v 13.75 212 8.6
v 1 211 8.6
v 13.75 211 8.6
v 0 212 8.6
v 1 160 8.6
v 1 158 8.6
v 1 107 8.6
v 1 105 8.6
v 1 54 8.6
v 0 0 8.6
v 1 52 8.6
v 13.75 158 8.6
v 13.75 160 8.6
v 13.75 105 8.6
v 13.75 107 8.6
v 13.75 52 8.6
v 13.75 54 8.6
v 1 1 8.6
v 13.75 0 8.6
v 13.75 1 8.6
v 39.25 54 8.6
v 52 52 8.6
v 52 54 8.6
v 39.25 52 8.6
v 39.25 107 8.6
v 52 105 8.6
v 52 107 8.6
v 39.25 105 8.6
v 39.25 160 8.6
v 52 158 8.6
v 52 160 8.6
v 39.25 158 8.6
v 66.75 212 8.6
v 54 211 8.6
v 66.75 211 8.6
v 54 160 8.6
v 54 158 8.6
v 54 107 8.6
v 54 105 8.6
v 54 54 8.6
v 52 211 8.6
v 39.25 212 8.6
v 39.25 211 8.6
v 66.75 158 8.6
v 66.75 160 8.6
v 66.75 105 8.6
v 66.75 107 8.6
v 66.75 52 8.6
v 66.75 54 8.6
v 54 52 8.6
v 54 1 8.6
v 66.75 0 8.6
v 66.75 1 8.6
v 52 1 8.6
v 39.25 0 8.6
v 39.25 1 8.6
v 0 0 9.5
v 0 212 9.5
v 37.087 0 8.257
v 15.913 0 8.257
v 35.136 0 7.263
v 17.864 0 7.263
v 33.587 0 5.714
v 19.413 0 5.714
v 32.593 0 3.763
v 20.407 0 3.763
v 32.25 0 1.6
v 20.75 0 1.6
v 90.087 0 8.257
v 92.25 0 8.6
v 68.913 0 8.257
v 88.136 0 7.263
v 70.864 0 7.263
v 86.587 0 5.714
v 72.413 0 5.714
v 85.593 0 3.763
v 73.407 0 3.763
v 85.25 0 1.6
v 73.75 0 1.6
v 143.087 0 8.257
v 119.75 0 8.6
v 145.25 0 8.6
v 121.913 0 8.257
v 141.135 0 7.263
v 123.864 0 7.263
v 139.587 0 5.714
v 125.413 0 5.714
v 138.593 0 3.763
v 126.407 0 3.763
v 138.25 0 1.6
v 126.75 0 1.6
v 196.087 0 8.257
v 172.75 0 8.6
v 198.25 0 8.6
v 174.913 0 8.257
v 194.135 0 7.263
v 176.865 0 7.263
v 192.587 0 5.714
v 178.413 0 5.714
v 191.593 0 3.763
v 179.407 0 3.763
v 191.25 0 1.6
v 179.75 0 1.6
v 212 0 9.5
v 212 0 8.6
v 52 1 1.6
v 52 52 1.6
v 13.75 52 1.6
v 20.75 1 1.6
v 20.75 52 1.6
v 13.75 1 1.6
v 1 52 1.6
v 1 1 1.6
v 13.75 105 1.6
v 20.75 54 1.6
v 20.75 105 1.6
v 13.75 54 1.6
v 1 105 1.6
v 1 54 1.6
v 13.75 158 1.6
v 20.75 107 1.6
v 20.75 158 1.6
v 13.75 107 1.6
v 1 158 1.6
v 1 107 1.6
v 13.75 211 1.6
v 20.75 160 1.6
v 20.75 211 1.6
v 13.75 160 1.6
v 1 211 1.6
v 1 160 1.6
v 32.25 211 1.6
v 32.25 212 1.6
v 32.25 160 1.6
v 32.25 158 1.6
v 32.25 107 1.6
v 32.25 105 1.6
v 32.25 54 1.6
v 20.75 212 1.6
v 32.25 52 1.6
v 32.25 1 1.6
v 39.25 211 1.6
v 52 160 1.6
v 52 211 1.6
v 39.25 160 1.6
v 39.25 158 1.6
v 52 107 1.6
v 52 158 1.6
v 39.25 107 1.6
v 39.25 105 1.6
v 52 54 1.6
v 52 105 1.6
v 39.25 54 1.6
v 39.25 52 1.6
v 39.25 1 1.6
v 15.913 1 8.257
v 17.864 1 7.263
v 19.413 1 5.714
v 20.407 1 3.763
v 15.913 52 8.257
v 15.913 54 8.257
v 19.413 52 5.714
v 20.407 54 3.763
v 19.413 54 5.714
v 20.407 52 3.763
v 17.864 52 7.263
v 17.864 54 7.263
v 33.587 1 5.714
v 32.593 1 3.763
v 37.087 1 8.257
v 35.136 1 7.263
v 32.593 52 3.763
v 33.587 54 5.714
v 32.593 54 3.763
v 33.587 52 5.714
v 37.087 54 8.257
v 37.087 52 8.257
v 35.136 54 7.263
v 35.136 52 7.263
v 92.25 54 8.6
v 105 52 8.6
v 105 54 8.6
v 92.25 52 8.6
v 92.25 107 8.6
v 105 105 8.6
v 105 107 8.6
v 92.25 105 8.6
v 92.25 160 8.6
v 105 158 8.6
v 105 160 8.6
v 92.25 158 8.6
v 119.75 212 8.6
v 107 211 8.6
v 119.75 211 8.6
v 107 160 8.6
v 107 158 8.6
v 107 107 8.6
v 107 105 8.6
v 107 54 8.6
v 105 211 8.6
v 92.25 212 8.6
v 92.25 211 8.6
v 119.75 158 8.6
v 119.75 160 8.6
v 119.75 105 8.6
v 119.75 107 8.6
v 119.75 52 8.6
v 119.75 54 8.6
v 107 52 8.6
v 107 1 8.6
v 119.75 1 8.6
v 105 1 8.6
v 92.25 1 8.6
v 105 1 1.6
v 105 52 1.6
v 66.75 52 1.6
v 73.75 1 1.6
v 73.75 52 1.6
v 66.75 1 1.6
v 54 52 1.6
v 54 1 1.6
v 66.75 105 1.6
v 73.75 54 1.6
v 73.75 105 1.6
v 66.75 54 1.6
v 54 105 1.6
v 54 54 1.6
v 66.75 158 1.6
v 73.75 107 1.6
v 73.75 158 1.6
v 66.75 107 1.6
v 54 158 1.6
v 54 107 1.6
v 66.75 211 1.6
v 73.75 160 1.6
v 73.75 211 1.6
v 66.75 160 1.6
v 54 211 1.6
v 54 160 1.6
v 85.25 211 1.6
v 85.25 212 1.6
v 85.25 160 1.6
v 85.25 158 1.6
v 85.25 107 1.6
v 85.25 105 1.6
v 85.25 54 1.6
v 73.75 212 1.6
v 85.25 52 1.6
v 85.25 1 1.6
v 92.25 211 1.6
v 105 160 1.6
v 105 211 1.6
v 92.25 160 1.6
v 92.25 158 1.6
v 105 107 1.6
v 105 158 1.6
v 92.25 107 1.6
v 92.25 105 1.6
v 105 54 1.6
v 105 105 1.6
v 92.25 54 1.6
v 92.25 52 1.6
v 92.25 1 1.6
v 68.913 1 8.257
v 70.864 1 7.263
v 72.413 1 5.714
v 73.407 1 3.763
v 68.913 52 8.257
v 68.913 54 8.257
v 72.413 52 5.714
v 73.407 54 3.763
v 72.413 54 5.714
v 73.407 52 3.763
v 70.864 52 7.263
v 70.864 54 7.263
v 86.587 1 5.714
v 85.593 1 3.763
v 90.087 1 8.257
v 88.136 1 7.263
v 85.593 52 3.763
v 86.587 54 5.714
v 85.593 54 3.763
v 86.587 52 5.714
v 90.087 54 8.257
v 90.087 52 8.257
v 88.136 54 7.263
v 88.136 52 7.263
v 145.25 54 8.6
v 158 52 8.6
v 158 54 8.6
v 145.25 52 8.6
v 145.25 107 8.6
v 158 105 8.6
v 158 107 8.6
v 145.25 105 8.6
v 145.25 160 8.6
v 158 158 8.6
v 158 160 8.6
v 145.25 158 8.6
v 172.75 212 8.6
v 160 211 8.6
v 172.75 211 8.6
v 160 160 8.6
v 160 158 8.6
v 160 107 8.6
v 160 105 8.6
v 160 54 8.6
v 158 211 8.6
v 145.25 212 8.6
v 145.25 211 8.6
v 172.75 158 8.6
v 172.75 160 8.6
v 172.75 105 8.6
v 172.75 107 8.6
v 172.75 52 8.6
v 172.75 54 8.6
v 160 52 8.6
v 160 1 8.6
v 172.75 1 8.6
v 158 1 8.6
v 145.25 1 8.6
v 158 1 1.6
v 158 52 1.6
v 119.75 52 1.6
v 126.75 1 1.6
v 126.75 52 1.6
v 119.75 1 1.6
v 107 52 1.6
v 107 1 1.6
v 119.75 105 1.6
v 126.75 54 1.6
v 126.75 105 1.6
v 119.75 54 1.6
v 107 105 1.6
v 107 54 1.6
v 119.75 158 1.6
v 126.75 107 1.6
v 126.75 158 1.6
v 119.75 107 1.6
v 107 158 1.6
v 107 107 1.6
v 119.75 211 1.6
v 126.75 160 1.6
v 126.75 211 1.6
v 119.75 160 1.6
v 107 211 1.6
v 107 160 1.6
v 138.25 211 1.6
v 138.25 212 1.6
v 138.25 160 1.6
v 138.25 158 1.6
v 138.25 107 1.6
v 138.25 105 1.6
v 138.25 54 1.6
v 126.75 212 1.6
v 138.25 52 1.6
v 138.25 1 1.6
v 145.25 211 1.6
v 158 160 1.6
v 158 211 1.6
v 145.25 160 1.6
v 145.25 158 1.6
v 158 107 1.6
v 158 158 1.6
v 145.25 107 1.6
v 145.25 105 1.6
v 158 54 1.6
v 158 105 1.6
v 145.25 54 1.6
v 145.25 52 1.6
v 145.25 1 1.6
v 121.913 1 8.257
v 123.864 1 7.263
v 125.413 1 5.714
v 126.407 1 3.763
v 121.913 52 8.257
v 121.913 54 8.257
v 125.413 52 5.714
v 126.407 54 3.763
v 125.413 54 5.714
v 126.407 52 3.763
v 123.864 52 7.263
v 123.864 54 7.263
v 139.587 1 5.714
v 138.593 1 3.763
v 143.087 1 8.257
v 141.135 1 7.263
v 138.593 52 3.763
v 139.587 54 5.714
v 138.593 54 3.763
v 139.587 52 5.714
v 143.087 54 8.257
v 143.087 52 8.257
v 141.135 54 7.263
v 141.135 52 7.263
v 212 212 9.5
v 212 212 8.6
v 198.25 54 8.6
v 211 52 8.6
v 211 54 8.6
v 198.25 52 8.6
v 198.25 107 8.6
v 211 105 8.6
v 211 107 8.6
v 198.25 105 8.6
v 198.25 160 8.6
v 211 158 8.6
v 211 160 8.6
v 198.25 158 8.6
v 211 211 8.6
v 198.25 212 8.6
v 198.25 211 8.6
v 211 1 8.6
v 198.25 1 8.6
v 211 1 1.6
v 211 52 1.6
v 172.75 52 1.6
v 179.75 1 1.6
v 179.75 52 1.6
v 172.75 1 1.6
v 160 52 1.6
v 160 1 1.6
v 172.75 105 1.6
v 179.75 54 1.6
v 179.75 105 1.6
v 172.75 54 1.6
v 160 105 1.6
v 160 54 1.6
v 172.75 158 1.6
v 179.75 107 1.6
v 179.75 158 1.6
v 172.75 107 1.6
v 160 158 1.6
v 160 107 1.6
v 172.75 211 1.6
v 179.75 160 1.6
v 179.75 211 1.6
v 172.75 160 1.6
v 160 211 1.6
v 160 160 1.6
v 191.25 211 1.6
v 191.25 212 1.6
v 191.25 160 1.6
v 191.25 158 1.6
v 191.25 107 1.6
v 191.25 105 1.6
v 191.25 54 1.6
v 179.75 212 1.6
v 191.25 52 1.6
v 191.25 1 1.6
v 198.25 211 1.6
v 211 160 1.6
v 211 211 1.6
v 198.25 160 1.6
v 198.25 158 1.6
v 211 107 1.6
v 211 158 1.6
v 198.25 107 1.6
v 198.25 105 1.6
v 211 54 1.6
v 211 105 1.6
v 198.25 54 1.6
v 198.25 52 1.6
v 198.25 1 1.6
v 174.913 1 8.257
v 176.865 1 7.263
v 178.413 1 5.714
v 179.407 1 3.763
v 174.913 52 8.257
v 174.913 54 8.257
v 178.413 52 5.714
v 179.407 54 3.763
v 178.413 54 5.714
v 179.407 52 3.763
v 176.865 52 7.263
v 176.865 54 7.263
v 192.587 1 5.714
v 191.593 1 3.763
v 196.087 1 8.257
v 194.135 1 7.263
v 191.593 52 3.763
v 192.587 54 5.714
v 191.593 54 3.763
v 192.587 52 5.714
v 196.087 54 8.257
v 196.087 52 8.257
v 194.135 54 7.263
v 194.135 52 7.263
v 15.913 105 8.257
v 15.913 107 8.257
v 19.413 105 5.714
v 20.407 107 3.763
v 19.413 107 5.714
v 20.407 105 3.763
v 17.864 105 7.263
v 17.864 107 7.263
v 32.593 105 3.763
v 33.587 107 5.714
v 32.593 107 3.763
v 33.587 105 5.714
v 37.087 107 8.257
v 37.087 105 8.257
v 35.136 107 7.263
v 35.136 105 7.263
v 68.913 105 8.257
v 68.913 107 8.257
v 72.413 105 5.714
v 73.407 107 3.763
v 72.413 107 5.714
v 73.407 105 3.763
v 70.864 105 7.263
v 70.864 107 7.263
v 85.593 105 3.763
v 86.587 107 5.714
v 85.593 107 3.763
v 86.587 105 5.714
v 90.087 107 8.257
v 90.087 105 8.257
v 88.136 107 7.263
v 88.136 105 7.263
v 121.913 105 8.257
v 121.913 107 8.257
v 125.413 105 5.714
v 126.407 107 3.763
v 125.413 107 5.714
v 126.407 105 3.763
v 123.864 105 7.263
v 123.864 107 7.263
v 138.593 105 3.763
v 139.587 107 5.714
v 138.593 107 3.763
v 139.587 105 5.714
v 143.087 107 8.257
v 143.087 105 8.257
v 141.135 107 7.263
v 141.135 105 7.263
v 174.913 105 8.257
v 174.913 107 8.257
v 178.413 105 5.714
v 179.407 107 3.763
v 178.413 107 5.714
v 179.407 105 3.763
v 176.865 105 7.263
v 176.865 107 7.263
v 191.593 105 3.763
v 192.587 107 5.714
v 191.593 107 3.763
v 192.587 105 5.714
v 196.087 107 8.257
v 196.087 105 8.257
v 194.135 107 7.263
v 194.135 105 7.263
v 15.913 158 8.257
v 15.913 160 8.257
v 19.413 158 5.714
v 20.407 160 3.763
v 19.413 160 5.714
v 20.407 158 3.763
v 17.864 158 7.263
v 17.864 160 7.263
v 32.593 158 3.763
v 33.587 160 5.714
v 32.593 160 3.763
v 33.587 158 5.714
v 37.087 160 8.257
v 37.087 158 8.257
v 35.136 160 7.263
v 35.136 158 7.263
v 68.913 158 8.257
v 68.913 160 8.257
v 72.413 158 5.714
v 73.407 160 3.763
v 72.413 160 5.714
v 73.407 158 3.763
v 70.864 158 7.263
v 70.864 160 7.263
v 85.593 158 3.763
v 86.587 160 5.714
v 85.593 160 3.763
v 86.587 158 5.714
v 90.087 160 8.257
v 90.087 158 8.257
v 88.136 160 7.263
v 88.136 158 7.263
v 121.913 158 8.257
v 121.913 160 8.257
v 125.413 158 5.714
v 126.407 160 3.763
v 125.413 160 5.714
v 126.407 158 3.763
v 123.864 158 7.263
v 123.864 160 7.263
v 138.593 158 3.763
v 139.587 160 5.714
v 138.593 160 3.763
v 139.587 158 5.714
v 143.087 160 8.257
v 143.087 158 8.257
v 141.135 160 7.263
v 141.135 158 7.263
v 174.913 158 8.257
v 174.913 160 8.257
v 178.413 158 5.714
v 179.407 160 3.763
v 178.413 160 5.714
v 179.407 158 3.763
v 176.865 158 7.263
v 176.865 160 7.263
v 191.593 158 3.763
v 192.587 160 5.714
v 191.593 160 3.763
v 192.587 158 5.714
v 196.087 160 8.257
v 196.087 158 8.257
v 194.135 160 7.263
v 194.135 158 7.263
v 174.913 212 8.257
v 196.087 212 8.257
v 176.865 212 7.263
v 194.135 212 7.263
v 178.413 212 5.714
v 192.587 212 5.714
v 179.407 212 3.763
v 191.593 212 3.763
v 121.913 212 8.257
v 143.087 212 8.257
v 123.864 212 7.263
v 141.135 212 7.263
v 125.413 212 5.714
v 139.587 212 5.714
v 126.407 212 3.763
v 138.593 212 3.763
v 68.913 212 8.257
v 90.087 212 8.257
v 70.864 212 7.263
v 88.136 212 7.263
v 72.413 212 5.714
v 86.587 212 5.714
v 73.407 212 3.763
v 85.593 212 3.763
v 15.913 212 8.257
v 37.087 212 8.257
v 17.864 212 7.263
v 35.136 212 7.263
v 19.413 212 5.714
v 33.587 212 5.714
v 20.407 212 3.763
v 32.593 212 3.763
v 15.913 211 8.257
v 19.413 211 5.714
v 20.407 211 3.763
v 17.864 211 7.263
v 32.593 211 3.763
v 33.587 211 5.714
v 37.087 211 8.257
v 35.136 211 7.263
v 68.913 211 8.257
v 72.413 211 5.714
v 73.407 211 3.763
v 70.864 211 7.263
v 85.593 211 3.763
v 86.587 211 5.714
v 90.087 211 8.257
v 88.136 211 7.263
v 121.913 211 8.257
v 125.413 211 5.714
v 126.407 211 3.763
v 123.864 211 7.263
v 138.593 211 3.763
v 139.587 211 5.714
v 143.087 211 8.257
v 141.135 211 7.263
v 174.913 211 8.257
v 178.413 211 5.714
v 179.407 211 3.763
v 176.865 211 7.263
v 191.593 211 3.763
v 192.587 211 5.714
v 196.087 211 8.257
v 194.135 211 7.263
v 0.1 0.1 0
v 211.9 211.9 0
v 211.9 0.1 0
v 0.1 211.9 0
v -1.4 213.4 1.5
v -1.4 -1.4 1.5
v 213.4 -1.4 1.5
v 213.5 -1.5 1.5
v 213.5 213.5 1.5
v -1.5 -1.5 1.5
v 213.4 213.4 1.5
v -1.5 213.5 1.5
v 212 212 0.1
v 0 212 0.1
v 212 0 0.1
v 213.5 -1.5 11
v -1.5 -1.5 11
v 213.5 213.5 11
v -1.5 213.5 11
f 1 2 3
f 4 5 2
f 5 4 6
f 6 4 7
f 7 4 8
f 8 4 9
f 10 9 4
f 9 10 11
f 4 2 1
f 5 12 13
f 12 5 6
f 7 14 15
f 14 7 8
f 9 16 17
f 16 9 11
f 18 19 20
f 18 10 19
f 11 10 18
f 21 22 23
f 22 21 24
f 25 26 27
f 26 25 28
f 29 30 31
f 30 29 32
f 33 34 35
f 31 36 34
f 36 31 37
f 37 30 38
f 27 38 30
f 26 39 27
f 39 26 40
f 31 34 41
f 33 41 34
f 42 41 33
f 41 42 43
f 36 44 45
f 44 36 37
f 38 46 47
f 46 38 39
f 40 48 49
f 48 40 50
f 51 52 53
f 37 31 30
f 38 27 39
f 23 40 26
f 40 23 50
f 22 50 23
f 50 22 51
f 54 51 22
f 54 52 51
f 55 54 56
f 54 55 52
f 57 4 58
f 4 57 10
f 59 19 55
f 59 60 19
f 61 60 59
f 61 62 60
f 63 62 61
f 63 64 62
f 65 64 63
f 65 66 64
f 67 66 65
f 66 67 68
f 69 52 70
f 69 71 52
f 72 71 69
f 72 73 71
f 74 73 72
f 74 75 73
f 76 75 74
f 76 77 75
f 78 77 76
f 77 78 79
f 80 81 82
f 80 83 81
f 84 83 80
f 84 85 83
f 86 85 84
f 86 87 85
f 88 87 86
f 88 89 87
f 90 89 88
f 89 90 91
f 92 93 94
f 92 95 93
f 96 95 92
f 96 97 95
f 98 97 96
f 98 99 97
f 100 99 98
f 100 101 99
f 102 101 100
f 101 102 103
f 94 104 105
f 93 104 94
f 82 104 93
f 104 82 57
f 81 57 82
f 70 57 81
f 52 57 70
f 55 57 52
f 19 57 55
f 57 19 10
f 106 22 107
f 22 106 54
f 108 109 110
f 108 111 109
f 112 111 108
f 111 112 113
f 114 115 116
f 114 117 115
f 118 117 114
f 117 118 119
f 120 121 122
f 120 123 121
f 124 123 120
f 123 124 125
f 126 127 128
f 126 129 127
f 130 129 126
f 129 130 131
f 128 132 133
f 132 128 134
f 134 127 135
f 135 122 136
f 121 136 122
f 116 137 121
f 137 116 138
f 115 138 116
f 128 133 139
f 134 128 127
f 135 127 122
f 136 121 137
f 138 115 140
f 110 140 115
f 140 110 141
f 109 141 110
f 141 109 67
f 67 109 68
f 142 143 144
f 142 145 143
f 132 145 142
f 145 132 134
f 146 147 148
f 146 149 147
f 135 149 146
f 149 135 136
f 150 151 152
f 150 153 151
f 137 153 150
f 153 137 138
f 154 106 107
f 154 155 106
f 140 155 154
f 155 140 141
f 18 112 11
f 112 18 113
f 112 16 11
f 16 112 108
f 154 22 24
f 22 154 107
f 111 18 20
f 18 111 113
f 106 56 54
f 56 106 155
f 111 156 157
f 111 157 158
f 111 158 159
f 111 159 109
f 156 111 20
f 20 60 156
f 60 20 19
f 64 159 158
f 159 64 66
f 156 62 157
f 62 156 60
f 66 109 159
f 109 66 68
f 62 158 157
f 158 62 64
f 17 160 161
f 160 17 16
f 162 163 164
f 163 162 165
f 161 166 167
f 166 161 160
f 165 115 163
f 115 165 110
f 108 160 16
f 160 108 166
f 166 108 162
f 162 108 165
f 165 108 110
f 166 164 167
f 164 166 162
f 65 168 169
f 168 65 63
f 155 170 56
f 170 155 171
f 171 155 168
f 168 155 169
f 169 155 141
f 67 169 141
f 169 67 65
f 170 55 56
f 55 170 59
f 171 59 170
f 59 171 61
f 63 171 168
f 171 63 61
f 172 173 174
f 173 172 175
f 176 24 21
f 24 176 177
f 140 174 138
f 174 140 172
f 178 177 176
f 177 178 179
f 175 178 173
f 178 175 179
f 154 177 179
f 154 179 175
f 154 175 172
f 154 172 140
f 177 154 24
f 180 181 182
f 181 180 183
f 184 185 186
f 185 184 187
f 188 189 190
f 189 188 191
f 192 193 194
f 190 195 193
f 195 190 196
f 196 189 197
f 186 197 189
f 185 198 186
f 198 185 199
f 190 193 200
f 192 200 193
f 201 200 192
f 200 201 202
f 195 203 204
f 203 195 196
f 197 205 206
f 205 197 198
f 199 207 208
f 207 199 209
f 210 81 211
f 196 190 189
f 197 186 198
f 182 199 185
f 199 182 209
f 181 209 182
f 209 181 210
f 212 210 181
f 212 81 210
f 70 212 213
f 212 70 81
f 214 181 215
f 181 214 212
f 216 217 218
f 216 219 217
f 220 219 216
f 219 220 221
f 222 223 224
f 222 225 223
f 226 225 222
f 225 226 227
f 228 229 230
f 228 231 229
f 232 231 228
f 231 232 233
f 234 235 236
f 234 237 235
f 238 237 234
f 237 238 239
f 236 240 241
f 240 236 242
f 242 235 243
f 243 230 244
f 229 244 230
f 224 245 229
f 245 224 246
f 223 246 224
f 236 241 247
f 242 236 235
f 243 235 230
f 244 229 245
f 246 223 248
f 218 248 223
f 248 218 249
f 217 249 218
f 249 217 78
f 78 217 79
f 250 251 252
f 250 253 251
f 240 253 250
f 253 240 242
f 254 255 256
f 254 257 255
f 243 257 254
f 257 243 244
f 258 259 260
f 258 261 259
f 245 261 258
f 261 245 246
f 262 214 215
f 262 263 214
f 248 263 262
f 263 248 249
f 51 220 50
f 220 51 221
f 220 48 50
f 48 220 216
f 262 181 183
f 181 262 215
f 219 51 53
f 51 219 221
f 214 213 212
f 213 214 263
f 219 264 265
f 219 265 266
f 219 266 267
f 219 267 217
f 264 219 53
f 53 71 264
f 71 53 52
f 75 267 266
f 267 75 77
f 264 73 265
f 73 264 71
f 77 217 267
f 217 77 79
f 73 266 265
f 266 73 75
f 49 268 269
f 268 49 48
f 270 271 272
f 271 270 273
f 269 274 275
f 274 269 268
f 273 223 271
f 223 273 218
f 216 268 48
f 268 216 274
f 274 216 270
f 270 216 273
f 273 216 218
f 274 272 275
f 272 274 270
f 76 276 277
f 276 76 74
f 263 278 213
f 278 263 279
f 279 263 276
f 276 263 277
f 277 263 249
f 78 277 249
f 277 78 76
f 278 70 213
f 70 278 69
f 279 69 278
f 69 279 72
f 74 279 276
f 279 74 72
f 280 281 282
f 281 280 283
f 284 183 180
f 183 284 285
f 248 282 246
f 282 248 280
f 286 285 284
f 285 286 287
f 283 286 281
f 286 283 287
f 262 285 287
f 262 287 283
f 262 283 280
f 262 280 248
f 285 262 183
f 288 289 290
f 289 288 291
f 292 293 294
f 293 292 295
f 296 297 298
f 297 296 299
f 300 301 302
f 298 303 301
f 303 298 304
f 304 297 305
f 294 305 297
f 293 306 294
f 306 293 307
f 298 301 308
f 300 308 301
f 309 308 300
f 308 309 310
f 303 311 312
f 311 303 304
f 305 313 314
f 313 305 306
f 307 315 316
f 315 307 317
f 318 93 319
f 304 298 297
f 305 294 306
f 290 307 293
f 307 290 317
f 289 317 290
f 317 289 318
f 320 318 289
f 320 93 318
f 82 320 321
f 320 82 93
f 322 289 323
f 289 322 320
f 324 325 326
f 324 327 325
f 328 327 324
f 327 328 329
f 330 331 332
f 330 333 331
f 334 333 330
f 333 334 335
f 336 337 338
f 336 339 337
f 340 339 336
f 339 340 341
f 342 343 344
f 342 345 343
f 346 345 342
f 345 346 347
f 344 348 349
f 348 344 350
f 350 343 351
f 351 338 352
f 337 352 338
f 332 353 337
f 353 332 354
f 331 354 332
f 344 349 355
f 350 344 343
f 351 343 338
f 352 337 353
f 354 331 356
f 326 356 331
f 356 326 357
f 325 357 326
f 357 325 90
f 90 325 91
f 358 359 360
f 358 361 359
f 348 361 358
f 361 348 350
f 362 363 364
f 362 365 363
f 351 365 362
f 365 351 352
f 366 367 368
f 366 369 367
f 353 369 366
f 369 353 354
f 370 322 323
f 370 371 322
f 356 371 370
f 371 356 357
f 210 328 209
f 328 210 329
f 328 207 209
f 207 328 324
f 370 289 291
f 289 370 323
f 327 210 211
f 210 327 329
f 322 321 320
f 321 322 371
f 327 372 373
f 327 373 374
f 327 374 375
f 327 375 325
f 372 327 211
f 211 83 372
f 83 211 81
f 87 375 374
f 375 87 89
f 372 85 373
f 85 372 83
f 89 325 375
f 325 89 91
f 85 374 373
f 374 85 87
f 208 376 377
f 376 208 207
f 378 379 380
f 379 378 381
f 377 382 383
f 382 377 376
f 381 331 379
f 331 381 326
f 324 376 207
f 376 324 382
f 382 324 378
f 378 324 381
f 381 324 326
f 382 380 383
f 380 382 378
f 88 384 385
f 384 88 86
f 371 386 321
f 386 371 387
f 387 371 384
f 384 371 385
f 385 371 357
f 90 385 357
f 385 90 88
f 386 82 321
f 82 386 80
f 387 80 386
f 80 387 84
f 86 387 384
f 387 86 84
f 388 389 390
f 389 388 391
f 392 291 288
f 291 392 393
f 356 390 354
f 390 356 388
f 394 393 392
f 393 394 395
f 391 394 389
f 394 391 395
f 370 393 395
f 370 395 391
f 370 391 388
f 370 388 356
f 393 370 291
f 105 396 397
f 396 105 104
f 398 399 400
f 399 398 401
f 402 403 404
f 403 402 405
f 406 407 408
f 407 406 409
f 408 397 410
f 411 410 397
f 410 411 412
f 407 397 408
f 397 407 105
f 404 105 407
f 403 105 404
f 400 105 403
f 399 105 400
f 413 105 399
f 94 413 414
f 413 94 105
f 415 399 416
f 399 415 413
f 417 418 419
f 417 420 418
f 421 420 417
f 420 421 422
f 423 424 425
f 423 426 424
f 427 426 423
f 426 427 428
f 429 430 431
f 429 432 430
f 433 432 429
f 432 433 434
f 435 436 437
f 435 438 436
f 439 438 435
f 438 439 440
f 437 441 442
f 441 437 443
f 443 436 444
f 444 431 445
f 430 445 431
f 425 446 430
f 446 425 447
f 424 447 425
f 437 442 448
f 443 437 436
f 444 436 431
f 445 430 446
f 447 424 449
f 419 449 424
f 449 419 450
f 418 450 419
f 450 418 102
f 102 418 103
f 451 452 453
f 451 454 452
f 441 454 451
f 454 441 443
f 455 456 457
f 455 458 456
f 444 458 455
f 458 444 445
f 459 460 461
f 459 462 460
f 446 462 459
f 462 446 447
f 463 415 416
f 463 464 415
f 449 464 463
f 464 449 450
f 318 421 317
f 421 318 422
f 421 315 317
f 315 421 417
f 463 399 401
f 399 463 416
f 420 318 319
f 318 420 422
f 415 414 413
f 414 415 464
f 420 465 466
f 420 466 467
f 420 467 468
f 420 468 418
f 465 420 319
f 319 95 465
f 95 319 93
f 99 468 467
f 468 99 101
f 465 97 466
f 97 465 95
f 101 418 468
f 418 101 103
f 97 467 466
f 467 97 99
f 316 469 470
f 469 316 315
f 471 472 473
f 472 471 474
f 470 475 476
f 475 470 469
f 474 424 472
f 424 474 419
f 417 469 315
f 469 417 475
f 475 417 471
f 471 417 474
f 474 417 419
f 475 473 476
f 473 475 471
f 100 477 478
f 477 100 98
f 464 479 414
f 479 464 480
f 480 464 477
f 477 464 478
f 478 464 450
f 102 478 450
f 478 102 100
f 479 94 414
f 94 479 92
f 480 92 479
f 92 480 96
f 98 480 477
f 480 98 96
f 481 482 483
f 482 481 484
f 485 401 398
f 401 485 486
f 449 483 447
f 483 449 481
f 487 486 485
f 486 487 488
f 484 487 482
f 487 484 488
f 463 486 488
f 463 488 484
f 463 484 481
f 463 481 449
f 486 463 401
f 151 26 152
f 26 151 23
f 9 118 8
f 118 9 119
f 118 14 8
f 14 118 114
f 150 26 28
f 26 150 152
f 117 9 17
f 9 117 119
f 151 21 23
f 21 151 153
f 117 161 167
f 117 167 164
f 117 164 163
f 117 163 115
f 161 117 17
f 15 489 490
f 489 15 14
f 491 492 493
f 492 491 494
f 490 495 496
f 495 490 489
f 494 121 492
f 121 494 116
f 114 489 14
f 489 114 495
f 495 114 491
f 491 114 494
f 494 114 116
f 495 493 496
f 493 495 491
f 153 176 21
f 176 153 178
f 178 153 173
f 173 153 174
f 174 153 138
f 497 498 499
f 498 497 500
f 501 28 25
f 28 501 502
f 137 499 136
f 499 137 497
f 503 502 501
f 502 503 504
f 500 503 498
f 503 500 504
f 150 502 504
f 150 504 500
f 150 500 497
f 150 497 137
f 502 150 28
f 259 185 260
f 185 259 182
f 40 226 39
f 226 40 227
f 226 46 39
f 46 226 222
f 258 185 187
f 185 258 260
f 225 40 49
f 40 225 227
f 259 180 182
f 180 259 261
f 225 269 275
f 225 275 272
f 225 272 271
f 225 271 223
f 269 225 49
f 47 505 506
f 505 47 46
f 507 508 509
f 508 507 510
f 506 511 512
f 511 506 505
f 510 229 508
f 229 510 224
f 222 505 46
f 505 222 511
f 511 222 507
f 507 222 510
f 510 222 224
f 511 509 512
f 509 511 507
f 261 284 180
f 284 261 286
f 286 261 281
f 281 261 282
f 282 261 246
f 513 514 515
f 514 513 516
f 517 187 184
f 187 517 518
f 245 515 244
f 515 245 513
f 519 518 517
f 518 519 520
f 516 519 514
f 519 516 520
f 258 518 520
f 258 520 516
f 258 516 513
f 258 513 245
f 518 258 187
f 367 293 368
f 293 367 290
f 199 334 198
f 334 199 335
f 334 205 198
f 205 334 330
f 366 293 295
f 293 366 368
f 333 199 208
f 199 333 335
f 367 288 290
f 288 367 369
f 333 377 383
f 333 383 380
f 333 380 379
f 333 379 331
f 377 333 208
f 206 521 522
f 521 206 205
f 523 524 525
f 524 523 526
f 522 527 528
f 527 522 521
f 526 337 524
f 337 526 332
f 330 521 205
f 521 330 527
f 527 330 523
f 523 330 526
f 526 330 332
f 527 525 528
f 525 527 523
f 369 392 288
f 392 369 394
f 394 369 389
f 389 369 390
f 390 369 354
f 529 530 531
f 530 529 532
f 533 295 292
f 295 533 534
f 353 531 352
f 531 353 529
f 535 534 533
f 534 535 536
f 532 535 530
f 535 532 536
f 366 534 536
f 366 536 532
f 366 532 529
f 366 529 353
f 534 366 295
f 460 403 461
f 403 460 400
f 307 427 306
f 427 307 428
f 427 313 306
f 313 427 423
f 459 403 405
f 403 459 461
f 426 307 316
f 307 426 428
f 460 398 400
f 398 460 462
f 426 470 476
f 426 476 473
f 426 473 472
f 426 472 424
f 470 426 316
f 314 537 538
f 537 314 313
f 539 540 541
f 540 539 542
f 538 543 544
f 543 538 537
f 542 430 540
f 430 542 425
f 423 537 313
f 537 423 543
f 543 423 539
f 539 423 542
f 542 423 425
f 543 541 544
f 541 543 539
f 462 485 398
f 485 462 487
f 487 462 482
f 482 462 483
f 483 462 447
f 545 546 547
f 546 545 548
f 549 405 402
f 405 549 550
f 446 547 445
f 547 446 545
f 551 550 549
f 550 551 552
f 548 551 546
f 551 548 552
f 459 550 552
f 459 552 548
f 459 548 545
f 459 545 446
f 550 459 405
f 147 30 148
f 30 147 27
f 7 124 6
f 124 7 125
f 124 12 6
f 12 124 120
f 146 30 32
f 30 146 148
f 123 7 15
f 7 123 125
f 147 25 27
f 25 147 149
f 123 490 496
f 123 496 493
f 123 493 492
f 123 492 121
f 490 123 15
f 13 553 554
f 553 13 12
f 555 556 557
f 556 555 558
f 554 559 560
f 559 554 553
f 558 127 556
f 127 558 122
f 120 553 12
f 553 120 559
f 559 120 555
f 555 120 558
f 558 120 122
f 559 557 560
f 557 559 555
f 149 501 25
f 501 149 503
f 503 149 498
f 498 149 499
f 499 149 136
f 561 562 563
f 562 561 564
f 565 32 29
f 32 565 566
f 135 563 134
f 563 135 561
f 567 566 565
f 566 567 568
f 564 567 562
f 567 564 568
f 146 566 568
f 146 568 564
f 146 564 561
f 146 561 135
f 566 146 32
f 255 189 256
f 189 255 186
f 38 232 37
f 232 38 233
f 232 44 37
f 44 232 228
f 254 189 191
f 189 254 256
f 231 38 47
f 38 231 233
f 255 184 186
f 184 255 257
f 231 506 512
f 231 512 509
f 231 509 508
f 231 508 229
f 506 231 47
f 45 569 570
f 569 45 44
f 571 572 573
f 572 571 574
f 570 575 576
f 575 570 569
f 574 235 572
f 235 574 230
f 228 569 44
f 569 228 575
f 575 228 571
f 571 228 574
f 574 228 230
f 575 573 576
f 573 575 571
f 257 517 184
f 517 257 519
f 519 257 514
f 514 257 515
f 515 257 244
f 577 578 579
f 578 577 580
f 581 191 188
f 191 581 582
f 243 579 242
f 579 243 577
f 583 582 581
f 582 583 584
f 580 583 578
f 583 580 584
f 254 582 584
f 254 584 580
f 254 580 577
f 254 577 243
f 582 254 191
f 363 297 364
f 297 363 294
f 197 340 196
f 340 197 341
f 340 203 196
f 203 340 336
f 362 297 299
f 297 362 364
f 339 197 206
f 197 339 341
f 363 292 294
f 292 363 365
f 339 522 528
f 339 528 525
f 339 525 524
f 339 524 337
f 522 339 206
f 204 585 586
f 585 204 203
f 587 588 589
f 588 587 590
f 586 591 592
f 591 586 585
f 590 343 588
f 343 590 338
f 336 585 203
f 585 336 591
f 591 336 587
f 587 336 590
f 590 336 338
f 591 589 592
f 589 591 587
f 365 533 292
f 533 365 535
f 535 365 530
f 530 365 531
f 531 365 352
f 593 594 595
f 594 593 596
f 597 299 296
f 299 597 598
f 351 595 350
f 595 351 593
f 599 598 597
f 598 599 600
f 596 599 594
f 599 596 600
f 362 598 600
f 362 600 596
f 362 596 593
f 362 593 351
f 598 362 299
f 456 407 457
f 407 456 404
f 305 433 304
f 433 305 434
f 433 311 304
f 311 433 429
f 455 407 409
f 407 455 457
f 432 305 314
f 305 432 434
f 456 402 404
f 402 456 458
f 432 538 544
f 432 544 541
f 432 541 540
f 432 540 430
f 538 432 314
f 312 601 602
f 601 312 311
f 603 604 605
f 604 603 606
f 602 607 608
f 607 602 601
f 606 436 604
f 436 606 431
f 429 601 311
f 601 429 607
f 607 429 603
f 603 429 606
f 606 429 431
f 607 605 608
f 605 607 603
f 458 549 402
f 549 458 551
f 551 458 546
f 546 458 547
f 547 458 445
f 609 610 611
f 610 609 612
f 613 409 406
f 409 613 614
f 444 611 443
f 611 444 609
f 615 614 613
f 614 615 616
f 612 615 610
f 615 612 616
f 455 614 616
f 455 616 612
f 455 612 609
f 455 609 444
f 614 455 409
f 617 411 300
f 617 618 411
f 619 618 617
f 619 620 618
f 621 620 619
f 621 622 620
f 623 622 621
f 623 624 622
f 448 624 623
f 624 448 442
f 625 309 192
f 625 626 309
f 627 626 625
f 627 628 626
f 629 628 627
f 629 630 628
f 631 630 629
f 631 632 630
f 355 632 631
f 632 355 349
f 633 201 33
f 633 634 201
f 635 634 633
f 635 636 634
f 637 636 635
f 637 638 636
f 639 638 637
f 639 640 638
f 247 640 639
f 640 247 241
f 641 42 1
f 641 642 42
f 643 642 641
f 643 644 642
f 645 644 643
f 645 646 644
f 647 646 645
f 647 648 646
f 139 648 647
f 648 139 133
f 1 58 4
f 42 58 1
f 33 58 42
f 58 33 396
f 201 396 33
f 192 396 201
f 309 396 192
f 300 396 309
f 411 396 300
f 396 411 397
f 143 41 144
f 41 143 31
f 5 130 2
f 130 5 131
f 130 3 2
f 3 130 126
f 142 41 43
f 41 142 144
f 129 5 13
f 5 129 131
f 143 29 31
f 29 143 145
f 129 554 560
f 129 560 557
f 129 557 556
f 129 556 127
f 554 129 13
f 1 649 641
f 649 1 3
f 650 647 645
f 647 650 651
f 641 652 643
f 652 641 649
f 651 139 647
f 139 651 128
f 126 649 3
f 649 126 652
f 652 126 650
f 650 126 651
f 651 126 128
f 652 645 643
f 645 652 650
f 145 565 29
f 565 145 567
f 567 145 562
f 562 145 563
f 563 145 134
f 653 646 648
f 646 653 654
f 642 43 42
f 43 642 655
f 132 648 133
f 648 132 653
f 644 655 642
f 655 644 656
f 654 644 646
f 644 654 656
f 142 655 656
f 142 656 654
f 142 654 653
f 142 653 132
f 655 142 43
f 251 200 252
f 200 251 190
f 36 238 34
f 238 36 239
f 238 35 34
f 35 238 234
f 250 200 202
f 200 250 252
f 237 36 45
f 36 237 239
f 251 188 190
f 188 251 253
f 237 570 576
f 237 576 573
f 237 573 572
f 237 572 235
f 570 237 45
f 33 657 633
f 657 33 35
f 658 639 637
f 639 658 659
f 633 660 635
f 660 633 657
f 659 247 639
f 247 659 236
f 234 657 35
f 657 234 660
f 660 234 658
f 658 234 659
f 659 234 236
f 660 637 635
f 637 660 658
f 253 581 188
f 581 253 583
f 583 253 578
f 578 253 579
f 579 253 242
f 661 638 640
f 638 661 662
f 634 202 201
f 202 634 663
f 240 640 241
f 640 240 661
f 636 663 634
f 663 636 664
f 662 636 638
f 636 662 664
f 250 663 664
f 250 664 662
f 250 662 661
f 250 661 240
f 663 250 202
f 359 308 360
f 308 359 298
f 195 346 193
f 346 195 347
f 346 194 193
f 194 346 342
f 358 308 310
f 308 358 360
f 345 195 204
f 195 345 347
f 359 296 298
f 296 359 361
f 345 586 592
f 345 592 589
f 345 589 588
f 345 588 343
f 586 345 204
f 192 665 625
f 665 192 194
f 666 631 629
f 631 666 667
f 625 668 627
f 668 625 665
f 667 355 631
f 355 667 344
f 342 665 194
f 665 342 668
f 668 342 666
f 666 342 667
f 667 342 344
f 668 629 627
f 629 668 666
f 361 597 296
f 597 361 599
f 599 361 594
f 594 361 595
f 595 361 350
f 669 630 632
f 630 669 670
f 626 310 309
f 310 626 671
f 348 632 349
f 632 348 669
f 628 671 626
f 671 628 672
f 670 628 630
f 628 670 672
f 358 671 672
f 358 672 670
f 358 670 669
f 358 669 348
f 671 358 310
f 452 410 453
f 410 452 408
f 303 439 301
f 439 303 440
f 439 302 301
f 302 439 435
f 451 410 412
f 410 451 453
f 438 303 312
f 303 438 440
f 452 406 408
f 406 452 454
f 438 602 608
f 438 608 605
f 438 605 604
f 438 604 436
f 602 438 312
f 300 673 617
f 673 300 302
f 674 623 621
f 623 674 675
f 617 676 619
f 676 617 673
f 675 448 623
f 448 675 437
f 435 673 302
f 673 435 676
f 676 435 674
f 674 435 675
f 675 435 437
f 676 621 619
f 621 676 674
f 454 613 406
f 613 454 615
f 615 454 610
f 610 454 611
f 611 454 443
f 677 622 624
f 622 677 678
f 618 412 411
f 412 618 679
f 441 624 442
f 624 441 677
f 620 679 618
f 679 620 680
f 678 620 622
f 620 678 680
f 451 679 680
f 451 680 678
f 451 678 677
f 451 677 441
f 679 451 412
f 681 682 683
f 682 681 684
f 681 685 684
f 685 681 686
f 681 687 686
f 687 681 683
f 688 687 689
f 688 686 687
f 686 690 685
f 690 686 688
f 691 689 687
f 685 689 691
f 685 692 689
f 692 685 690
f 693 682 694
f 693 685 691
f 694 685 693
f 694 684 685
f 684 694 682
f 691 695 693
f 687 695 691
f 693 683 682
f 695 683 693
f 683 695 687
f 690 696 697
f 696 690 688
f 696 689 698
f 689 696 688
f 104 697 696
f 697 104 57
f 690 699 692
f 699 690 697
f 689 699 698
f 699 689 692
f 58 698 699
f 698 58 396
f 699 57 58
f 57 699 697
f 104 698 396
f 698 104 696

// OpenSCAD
// Number of rows
rows=4;
// Number of columns
columns=4;
// Separation between slots
slot_separation=2.0;

// Size of the slots
size=50.0;
// Inner padding for the slots
size_padding = 1.0;
// Depth of the slots
depth=7.0;

// Width of the walls
wall=1.5;

print_box = true;
print_lid = false;

/* [Hidden] */
inner_size = size+size_padding;
total_size = inner_size + slot_separation;
external_x_size = inner_size*rows+slot_separation*rows;
external_y_size = inner_size*columns+slot_separation*columns;
tolerance = 0.1;

module pieSlice(a, r, h){
  // a:angle, r:radius, h:height
  rotate_extrude(angle=a) square([r,h]);
}

module slot() {
    union() {
        difference() {
            cube([inner_size+slot_separation, inner_size+slot_separation, depth+wall]);
            translate([slot_separation/2,slot_separation/2,wall])cube([inner_size, inner_size, depth]);
            translate([(slot_separation/2)+inner_size/4,0,wall])cube([inner_size/2,inner_size+slot_separation, depth]);
        }
        //linear_extrude(wall)circle(depth);
        translate([(slot_separation/2)+inner_size/4,slot_separation/2,wall]) rotate([90,0,0]) pieSlice(90, depth, slot_separation/2);
        translate([(slot_separation/2)+inner_size/4,slot_separation+inner_size,wall]) rotate([90,0,0]) pieSlice(90, depth, slot_separation/2);
        translate([(inner_size+slot_separation)-slot_separation/2-inner_size/4,0,wall])rotate([90,0,180]) pieSlice(90, depth, slot_separation/2);
        translate([(inner_size+slot_separation)-slot_separation/2-inner_size/4,slot_separation/2+inner_size,wall])rotate([90,0,180]) pieSlice(90, depth, slot_separation/2);
    }
}

module outer_wall(lenght) {
    linear_extrude(lenght) {
        polygon(points = [[0,0],[wall,0],[wall,depth+size_padding],[0,depth+size_padding+wall]]);
    }   
}

module row () {
    for (i = [0:columns-1]) {
        translate([total_size*i,0,tolerance]) slot();
    }    
}

module base() {
polyhedron(points=[[tolerance,tolerance,0],
                   [external_x_size-tolerance,tolerance,0],
                   [external_x_size-tolerance,external_y_size-tolerance,0],
                   [tolerance,external_y_size-tolerance,0],
                   [-wall+tolerance,-wall+tolerance,wall],
                   [external_x_size+wall-tolerance,-wall+tolerance,wall],
                   [external_x_size+wall-tolerance,external_y_size+wall-tolerance,wall],
                   [-wall+tolerance,external_y_size+wall-tolerance,wall]],
           faces=[[0,1,2,3],
                  [7,6,5,4],
                  [5,6,2,1],
                  [6,7,3,2],
                  [7,4,0,3],
                  [4,5,1,0]]);
}

if (print_box == true) {

for (i = [0:rows-1]) {  
    translate([0,total_size*i,0])row();
}

// Base
base();

// External walls
translate([-wall,-wall,wall]) rotate([90,0,90]) outer_wall(external_x_size+wall*2);
translate([external_x_size+wall,external_y_size+wall,wall]) rotate([90,0,-90]) outer_wall(external_x_size+wall*2);
translate([-wall,external_y_size+wall,wall]) rotate([90,0,0]) outer_wall(external_x_size+wall*2);
translate([external_x_size+wall,-wall,wall]) rotate([90,0,180]) outer_wall(external_x_size+wall*2);

}

if (print_lid == true) {
    translate ([external_x_size+wall*2+15,0,0])
    union() {
        base();
        translate([-wall,-wall,wall]) cube([external_x_size+wall*2, external_y_size+wall*2, wall/2]);
    }
}
